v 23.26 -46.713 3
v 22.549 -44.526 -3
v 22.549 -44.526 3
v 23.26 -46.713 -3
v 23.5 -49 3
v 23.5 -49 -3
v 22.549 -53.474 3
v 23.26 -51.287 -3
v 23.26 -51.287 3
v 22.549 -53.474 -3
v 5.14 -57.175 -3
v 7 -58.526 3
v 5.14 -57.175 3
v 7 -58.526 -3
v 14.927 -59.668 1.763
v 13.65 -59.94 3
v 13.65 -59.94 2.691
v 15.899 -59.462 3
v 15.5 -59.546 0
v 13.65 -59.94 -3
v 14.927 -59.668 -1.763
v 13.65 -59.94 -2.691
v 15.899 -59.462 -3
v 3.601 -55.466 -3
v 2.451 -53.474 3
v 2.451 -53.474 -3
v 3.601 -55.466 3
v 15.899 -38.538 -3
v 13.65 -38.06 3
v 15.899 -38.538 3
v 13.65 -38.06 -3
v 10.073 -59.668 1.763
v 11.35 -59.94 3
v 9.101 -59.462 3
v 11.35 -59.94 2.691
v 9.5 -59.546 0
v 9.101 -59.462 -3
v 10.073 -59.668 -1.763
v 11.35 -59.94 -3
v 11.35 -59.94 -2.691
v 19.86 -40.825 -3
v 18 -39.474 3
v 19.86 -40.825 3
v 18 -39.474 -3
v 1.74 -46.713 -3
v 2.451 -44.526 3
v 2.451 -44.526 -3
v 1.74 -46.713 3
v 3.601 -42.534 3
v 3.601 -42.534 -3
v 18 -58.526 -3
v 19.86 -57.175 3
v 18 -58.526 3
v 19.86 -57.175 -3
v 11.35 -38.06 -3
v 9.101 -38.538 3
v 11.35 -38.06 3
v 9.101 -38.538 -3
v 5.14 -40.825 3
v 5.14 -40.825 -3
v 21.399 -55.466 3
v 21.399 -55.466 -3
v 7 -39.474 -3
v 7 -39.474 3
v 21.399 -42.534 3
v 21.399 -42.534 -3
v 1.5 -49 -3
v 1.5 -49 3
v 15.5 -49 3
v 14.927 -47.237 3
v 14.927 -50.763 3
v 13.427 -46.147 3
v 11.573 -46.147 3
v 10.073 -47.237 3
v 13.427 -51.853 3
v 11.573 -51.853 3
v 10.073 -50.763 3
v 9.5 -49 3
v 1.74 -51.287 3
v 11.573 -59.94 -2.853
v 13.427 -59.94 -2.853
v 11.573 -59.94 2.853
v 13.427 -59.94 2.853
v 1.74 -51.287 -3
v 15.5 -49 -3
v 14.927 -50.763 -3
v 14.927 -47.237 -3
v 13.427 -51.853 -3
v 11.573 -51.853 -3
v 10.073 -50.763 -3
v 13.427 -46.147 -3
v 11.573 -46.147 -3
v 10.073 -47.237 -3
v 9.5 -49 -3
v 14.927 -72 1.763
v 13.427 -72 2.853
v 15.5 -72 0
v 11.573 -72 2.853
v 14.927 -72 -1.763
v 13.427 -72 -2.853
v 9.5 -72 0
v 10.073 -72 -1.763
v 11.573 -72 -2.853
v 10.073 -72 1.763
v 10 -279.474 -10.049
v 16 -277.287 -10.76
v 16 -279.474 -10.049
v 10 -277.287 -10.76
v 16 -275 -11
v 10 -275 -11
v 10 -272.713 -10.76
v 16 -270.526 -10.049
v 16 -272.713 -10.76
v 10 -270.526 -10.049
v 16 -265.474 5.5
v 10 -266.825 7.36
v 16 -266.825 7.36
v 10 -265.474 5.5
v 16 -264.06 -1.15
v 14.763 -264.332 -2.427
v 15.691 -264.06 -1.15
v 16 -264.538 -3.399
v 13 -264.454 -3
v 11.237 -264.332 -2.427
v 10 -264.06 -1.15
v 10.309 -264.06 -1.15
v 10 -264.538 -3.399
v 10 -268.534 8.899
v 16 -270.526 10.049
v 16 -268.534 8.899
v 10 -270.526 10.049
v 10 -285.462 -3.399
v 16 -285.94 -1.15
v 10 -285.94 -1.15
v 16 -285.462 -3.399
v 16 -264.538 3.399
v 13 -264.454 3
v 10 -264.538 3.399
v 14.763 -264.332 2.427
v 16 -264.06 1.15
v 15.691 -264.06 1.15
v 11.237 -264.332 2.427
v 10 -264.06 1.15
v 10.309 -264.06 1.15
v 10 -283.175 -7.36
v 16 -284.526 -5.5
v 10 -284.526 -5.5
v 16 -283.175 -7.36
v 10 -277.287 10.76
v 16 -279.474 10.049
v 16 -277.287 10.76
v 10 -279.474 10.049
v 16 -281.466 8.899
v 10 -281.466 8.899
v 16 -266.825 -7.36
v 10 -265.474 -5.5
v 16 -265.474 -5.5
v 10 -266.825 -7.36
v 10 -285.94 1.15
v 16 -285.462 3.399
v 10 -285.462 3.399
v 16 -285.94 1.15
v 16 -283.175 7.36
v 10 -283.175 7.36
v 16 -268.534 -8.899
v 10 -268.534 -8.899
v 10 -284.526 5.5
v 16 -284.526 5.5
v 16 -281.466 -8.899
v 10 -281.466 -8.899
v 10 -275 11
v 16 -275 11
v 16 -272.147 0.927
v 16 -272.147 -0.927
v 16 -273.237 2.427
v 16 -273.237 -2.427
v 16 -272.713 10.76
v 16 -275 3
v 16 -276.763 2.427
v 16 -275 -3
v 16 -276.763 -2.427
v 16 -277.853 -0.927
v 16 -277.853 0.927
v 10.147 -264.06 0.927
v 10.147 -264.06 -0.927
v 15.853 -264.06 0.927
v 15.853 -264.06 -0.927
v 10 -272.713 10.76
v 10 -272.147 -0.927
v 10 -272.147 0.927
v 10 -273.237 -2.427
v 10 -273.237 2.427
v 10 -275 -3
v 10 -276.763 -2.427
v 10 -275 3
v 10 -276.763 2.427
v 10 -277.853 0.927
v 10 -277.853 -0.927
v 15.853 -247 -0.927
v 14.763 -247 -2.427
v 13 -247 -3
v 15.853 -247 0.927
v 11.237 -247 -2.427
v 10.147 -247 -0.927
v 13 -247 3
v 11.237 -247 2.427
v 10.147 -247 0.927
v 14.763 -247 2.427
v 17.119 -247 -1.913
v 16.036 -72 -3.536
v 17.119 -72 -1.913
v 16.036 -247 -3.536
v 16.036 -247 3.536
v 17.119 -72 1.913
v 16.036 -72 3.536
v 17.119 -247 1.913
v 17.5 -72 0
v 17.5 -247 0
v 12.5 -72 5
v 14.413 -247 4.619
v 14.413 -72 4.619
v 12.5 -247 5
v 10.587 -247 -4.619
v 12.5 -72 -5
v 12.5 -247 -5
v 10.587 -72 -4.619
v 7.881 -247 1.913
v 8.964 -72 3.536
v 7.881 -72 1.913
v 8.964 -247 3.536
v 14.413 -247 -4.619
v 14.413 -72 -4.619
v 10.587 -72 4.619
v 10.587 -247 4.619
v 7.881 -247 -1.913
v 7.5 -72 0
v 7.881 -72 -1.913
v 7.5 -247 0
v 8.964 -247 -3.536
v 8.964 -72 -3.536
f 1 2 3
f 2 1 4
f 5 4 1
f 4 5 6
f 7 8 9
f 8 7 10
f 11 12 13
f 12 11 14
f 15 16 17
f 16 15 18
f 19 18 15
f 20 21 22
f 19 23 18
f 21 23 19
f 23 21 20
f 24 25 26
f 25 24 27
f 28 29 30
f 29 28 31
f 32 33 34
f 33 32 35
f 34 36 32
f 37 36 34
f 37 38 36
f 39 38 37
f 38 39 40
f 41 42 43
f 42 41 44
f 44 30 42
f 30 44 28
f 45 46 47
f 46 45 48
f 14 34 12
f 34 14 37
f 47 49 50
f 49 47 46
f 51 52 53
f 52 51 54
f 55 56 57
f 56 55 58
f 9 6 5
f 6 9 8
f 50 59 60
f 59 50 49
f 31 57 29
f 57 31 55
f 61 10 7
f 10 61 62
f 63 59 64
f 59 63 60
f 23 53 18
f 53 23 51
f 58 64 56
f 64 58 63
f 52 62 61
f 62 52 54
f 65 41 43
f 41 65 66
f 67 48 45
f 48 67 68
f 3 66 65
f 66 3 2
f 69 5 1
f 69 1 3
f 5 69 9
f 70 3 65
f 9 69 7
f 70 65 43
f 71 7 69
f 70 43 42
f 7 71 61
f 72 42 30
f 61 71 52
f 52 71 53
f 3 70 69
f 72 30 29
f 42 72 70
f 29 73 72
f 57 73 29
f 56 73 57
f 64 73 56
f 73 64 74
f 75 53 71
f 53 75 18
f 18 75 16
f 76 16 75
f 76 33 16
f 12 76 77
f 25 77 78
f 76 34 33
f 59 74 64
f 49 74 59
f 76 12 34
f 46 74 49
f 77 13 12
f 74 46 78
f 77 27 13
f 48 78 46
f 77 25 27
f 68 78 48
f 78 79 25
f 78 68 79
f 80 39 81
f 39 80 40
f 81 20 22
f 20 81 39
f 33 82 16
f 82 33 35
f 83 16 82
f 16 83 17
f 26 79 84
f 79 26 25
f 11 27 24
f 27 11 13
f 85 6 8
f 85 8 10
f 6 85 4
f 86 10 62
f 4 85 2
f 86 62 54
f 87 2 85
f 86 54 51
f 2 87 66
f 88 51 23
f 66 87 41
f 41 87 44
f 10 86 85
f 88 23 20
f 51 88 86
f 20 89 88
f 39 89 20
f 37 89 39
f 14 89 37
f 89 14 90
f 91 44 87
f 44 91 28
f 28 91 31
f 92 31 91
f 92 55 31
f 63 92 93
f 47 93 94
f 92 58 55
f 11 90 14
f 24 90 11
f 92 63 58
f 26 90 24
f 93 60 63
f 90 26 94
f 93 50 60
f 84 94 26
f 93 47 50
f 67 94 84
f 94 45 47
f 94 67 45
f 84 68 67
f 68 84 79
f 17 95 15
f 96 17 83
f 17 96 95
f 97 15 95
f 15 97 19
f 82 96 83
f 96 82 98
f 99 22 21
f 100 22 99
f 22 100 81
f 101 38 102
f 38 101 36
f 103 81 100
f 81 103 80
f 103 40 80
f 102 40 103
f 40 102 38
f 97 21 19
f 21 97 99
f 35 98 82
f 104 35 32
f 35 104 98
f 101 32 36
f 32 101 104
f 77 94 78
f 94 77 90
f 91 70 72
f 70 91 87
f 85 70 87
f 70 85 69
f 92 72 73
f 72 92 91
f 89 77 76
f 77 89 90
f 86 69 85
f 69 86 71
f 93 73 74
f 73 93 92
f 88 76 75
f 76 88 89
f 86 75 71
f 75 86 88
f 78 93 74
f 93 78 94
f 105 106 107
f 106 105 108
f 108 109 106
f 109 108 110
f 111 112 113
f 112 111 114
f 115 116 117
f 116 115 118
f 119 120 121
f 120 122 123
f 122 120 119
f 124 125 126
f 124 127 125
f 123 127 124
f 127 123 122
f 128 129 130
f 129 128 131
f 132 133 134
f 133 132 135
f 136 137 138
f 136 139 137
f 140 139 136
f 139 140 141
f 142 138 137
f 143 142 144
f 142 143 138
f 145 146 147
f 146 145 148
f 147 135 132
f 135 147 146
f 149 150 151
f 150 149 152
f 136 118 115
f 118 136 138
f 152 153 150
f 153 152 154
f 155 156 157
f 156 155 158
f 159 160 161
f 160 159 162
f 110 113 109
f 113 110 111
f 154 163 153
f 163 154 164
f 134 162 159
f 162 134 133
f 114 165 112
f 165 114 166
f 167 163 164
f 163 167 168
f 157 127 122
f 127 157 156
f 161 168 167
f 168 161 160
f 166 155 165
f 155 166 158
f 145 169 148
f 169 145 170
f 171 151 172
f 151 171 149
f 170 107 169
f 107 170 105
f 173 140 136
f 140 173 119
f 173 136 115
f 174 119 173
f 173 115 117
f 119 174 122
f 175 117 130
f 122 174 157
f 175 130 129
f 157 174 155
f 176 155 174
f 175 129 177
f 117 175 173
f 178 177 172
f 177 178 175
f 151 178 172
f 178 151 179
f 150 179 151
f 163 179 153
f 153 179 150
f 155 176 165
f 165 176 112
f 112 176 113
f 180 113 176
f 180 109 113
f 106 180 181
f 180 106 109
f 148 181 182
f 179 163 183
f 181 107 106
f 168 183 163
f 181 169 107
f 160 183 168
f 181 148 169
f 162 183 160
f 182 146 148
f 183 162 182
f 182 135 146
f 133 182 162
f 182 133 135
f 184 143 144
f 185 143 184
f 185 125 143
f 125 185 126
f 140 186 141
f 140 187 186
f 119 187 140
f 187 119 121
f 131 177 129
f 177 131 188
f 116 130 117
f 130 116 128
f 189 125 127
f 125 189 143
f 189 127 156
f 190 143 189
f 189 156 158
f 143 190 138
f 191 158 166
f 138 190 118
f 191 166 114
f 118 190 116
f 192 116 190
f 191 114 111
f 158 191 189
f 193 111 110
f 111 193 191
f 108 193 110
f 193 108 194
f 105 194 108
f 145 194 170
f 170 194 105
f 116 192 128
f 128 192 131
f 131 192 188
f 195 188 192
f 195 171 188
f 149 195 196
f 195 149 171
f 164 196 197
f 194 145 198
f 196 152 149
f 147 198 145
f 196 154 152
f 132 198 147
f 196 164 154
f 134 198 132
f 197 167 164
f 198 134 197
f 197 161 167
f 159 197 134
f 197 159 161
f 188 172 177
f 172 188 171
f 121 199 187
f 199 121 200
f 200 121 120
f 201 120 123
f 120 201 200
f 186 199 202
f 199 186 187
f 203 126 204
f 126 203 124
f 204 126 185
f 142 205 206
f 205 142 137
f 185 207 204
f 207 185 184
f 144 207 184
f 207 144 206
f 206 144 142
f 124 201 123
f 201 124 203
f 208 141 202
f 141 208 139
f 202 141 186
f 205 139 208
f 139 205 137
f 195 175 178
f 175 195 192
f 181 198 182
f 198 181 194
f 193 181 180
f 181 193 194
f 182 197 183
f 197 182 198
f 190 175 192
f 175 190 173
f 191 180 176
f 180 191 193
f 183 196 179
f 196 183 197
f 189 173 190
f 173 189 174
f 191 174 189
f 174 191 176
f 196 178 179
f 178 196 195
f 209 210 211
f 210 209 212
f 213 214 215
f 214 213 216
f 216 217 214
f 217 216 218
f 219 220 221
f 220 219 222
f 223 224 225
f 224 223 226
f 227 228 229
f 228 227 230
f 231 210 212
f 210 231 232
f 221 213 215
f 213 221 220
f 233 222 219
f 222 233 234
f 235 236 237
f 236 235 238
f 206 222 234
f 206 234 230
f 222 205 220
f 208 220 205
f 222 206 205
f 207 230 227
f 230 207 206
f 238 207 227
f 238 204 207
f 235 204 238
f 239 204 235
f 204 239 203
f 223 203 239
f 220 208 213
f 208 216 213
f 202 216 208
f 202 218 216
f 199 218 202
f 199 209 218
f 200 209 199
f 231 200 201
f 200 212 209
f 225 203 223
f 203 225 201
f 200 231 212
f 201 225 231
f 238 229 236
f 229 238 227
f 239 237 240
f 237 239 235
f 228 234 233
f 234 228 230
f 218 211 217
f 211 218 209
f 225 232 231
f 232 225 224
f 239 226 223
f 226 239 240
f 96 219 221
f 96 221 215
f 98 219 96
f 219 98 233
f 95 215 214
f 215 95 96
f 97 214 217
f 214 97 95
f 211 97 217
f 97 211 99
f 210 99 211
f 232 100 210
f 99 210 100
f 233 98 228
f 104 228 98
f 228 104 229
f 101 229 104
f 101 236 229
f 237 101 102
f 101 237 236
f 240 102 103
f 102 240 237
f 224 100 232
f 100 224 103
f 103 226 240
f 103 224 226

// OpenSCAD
tierod();

module tierod(){
    translate([12.5,-49,-3]) flexCple();
    translate([10,-275,0]) 
            rotate([0,90,0]) mirror([0,1,0]) flexCple();
    color("lightblue") translate([12.5,-72,0]) 
            rotate([90,0,0]) cylinder(r=5,h=175);
}

module flexCple() color("silver") difference(){
    union(){
        cylinder(r=11,h=6);
        translate([0,0,3]) rotate([90,0,0]) cylinder(r=3,h=40);
    }
    translate([0,0,-1]) cylinder(r=3,h=8);
}
